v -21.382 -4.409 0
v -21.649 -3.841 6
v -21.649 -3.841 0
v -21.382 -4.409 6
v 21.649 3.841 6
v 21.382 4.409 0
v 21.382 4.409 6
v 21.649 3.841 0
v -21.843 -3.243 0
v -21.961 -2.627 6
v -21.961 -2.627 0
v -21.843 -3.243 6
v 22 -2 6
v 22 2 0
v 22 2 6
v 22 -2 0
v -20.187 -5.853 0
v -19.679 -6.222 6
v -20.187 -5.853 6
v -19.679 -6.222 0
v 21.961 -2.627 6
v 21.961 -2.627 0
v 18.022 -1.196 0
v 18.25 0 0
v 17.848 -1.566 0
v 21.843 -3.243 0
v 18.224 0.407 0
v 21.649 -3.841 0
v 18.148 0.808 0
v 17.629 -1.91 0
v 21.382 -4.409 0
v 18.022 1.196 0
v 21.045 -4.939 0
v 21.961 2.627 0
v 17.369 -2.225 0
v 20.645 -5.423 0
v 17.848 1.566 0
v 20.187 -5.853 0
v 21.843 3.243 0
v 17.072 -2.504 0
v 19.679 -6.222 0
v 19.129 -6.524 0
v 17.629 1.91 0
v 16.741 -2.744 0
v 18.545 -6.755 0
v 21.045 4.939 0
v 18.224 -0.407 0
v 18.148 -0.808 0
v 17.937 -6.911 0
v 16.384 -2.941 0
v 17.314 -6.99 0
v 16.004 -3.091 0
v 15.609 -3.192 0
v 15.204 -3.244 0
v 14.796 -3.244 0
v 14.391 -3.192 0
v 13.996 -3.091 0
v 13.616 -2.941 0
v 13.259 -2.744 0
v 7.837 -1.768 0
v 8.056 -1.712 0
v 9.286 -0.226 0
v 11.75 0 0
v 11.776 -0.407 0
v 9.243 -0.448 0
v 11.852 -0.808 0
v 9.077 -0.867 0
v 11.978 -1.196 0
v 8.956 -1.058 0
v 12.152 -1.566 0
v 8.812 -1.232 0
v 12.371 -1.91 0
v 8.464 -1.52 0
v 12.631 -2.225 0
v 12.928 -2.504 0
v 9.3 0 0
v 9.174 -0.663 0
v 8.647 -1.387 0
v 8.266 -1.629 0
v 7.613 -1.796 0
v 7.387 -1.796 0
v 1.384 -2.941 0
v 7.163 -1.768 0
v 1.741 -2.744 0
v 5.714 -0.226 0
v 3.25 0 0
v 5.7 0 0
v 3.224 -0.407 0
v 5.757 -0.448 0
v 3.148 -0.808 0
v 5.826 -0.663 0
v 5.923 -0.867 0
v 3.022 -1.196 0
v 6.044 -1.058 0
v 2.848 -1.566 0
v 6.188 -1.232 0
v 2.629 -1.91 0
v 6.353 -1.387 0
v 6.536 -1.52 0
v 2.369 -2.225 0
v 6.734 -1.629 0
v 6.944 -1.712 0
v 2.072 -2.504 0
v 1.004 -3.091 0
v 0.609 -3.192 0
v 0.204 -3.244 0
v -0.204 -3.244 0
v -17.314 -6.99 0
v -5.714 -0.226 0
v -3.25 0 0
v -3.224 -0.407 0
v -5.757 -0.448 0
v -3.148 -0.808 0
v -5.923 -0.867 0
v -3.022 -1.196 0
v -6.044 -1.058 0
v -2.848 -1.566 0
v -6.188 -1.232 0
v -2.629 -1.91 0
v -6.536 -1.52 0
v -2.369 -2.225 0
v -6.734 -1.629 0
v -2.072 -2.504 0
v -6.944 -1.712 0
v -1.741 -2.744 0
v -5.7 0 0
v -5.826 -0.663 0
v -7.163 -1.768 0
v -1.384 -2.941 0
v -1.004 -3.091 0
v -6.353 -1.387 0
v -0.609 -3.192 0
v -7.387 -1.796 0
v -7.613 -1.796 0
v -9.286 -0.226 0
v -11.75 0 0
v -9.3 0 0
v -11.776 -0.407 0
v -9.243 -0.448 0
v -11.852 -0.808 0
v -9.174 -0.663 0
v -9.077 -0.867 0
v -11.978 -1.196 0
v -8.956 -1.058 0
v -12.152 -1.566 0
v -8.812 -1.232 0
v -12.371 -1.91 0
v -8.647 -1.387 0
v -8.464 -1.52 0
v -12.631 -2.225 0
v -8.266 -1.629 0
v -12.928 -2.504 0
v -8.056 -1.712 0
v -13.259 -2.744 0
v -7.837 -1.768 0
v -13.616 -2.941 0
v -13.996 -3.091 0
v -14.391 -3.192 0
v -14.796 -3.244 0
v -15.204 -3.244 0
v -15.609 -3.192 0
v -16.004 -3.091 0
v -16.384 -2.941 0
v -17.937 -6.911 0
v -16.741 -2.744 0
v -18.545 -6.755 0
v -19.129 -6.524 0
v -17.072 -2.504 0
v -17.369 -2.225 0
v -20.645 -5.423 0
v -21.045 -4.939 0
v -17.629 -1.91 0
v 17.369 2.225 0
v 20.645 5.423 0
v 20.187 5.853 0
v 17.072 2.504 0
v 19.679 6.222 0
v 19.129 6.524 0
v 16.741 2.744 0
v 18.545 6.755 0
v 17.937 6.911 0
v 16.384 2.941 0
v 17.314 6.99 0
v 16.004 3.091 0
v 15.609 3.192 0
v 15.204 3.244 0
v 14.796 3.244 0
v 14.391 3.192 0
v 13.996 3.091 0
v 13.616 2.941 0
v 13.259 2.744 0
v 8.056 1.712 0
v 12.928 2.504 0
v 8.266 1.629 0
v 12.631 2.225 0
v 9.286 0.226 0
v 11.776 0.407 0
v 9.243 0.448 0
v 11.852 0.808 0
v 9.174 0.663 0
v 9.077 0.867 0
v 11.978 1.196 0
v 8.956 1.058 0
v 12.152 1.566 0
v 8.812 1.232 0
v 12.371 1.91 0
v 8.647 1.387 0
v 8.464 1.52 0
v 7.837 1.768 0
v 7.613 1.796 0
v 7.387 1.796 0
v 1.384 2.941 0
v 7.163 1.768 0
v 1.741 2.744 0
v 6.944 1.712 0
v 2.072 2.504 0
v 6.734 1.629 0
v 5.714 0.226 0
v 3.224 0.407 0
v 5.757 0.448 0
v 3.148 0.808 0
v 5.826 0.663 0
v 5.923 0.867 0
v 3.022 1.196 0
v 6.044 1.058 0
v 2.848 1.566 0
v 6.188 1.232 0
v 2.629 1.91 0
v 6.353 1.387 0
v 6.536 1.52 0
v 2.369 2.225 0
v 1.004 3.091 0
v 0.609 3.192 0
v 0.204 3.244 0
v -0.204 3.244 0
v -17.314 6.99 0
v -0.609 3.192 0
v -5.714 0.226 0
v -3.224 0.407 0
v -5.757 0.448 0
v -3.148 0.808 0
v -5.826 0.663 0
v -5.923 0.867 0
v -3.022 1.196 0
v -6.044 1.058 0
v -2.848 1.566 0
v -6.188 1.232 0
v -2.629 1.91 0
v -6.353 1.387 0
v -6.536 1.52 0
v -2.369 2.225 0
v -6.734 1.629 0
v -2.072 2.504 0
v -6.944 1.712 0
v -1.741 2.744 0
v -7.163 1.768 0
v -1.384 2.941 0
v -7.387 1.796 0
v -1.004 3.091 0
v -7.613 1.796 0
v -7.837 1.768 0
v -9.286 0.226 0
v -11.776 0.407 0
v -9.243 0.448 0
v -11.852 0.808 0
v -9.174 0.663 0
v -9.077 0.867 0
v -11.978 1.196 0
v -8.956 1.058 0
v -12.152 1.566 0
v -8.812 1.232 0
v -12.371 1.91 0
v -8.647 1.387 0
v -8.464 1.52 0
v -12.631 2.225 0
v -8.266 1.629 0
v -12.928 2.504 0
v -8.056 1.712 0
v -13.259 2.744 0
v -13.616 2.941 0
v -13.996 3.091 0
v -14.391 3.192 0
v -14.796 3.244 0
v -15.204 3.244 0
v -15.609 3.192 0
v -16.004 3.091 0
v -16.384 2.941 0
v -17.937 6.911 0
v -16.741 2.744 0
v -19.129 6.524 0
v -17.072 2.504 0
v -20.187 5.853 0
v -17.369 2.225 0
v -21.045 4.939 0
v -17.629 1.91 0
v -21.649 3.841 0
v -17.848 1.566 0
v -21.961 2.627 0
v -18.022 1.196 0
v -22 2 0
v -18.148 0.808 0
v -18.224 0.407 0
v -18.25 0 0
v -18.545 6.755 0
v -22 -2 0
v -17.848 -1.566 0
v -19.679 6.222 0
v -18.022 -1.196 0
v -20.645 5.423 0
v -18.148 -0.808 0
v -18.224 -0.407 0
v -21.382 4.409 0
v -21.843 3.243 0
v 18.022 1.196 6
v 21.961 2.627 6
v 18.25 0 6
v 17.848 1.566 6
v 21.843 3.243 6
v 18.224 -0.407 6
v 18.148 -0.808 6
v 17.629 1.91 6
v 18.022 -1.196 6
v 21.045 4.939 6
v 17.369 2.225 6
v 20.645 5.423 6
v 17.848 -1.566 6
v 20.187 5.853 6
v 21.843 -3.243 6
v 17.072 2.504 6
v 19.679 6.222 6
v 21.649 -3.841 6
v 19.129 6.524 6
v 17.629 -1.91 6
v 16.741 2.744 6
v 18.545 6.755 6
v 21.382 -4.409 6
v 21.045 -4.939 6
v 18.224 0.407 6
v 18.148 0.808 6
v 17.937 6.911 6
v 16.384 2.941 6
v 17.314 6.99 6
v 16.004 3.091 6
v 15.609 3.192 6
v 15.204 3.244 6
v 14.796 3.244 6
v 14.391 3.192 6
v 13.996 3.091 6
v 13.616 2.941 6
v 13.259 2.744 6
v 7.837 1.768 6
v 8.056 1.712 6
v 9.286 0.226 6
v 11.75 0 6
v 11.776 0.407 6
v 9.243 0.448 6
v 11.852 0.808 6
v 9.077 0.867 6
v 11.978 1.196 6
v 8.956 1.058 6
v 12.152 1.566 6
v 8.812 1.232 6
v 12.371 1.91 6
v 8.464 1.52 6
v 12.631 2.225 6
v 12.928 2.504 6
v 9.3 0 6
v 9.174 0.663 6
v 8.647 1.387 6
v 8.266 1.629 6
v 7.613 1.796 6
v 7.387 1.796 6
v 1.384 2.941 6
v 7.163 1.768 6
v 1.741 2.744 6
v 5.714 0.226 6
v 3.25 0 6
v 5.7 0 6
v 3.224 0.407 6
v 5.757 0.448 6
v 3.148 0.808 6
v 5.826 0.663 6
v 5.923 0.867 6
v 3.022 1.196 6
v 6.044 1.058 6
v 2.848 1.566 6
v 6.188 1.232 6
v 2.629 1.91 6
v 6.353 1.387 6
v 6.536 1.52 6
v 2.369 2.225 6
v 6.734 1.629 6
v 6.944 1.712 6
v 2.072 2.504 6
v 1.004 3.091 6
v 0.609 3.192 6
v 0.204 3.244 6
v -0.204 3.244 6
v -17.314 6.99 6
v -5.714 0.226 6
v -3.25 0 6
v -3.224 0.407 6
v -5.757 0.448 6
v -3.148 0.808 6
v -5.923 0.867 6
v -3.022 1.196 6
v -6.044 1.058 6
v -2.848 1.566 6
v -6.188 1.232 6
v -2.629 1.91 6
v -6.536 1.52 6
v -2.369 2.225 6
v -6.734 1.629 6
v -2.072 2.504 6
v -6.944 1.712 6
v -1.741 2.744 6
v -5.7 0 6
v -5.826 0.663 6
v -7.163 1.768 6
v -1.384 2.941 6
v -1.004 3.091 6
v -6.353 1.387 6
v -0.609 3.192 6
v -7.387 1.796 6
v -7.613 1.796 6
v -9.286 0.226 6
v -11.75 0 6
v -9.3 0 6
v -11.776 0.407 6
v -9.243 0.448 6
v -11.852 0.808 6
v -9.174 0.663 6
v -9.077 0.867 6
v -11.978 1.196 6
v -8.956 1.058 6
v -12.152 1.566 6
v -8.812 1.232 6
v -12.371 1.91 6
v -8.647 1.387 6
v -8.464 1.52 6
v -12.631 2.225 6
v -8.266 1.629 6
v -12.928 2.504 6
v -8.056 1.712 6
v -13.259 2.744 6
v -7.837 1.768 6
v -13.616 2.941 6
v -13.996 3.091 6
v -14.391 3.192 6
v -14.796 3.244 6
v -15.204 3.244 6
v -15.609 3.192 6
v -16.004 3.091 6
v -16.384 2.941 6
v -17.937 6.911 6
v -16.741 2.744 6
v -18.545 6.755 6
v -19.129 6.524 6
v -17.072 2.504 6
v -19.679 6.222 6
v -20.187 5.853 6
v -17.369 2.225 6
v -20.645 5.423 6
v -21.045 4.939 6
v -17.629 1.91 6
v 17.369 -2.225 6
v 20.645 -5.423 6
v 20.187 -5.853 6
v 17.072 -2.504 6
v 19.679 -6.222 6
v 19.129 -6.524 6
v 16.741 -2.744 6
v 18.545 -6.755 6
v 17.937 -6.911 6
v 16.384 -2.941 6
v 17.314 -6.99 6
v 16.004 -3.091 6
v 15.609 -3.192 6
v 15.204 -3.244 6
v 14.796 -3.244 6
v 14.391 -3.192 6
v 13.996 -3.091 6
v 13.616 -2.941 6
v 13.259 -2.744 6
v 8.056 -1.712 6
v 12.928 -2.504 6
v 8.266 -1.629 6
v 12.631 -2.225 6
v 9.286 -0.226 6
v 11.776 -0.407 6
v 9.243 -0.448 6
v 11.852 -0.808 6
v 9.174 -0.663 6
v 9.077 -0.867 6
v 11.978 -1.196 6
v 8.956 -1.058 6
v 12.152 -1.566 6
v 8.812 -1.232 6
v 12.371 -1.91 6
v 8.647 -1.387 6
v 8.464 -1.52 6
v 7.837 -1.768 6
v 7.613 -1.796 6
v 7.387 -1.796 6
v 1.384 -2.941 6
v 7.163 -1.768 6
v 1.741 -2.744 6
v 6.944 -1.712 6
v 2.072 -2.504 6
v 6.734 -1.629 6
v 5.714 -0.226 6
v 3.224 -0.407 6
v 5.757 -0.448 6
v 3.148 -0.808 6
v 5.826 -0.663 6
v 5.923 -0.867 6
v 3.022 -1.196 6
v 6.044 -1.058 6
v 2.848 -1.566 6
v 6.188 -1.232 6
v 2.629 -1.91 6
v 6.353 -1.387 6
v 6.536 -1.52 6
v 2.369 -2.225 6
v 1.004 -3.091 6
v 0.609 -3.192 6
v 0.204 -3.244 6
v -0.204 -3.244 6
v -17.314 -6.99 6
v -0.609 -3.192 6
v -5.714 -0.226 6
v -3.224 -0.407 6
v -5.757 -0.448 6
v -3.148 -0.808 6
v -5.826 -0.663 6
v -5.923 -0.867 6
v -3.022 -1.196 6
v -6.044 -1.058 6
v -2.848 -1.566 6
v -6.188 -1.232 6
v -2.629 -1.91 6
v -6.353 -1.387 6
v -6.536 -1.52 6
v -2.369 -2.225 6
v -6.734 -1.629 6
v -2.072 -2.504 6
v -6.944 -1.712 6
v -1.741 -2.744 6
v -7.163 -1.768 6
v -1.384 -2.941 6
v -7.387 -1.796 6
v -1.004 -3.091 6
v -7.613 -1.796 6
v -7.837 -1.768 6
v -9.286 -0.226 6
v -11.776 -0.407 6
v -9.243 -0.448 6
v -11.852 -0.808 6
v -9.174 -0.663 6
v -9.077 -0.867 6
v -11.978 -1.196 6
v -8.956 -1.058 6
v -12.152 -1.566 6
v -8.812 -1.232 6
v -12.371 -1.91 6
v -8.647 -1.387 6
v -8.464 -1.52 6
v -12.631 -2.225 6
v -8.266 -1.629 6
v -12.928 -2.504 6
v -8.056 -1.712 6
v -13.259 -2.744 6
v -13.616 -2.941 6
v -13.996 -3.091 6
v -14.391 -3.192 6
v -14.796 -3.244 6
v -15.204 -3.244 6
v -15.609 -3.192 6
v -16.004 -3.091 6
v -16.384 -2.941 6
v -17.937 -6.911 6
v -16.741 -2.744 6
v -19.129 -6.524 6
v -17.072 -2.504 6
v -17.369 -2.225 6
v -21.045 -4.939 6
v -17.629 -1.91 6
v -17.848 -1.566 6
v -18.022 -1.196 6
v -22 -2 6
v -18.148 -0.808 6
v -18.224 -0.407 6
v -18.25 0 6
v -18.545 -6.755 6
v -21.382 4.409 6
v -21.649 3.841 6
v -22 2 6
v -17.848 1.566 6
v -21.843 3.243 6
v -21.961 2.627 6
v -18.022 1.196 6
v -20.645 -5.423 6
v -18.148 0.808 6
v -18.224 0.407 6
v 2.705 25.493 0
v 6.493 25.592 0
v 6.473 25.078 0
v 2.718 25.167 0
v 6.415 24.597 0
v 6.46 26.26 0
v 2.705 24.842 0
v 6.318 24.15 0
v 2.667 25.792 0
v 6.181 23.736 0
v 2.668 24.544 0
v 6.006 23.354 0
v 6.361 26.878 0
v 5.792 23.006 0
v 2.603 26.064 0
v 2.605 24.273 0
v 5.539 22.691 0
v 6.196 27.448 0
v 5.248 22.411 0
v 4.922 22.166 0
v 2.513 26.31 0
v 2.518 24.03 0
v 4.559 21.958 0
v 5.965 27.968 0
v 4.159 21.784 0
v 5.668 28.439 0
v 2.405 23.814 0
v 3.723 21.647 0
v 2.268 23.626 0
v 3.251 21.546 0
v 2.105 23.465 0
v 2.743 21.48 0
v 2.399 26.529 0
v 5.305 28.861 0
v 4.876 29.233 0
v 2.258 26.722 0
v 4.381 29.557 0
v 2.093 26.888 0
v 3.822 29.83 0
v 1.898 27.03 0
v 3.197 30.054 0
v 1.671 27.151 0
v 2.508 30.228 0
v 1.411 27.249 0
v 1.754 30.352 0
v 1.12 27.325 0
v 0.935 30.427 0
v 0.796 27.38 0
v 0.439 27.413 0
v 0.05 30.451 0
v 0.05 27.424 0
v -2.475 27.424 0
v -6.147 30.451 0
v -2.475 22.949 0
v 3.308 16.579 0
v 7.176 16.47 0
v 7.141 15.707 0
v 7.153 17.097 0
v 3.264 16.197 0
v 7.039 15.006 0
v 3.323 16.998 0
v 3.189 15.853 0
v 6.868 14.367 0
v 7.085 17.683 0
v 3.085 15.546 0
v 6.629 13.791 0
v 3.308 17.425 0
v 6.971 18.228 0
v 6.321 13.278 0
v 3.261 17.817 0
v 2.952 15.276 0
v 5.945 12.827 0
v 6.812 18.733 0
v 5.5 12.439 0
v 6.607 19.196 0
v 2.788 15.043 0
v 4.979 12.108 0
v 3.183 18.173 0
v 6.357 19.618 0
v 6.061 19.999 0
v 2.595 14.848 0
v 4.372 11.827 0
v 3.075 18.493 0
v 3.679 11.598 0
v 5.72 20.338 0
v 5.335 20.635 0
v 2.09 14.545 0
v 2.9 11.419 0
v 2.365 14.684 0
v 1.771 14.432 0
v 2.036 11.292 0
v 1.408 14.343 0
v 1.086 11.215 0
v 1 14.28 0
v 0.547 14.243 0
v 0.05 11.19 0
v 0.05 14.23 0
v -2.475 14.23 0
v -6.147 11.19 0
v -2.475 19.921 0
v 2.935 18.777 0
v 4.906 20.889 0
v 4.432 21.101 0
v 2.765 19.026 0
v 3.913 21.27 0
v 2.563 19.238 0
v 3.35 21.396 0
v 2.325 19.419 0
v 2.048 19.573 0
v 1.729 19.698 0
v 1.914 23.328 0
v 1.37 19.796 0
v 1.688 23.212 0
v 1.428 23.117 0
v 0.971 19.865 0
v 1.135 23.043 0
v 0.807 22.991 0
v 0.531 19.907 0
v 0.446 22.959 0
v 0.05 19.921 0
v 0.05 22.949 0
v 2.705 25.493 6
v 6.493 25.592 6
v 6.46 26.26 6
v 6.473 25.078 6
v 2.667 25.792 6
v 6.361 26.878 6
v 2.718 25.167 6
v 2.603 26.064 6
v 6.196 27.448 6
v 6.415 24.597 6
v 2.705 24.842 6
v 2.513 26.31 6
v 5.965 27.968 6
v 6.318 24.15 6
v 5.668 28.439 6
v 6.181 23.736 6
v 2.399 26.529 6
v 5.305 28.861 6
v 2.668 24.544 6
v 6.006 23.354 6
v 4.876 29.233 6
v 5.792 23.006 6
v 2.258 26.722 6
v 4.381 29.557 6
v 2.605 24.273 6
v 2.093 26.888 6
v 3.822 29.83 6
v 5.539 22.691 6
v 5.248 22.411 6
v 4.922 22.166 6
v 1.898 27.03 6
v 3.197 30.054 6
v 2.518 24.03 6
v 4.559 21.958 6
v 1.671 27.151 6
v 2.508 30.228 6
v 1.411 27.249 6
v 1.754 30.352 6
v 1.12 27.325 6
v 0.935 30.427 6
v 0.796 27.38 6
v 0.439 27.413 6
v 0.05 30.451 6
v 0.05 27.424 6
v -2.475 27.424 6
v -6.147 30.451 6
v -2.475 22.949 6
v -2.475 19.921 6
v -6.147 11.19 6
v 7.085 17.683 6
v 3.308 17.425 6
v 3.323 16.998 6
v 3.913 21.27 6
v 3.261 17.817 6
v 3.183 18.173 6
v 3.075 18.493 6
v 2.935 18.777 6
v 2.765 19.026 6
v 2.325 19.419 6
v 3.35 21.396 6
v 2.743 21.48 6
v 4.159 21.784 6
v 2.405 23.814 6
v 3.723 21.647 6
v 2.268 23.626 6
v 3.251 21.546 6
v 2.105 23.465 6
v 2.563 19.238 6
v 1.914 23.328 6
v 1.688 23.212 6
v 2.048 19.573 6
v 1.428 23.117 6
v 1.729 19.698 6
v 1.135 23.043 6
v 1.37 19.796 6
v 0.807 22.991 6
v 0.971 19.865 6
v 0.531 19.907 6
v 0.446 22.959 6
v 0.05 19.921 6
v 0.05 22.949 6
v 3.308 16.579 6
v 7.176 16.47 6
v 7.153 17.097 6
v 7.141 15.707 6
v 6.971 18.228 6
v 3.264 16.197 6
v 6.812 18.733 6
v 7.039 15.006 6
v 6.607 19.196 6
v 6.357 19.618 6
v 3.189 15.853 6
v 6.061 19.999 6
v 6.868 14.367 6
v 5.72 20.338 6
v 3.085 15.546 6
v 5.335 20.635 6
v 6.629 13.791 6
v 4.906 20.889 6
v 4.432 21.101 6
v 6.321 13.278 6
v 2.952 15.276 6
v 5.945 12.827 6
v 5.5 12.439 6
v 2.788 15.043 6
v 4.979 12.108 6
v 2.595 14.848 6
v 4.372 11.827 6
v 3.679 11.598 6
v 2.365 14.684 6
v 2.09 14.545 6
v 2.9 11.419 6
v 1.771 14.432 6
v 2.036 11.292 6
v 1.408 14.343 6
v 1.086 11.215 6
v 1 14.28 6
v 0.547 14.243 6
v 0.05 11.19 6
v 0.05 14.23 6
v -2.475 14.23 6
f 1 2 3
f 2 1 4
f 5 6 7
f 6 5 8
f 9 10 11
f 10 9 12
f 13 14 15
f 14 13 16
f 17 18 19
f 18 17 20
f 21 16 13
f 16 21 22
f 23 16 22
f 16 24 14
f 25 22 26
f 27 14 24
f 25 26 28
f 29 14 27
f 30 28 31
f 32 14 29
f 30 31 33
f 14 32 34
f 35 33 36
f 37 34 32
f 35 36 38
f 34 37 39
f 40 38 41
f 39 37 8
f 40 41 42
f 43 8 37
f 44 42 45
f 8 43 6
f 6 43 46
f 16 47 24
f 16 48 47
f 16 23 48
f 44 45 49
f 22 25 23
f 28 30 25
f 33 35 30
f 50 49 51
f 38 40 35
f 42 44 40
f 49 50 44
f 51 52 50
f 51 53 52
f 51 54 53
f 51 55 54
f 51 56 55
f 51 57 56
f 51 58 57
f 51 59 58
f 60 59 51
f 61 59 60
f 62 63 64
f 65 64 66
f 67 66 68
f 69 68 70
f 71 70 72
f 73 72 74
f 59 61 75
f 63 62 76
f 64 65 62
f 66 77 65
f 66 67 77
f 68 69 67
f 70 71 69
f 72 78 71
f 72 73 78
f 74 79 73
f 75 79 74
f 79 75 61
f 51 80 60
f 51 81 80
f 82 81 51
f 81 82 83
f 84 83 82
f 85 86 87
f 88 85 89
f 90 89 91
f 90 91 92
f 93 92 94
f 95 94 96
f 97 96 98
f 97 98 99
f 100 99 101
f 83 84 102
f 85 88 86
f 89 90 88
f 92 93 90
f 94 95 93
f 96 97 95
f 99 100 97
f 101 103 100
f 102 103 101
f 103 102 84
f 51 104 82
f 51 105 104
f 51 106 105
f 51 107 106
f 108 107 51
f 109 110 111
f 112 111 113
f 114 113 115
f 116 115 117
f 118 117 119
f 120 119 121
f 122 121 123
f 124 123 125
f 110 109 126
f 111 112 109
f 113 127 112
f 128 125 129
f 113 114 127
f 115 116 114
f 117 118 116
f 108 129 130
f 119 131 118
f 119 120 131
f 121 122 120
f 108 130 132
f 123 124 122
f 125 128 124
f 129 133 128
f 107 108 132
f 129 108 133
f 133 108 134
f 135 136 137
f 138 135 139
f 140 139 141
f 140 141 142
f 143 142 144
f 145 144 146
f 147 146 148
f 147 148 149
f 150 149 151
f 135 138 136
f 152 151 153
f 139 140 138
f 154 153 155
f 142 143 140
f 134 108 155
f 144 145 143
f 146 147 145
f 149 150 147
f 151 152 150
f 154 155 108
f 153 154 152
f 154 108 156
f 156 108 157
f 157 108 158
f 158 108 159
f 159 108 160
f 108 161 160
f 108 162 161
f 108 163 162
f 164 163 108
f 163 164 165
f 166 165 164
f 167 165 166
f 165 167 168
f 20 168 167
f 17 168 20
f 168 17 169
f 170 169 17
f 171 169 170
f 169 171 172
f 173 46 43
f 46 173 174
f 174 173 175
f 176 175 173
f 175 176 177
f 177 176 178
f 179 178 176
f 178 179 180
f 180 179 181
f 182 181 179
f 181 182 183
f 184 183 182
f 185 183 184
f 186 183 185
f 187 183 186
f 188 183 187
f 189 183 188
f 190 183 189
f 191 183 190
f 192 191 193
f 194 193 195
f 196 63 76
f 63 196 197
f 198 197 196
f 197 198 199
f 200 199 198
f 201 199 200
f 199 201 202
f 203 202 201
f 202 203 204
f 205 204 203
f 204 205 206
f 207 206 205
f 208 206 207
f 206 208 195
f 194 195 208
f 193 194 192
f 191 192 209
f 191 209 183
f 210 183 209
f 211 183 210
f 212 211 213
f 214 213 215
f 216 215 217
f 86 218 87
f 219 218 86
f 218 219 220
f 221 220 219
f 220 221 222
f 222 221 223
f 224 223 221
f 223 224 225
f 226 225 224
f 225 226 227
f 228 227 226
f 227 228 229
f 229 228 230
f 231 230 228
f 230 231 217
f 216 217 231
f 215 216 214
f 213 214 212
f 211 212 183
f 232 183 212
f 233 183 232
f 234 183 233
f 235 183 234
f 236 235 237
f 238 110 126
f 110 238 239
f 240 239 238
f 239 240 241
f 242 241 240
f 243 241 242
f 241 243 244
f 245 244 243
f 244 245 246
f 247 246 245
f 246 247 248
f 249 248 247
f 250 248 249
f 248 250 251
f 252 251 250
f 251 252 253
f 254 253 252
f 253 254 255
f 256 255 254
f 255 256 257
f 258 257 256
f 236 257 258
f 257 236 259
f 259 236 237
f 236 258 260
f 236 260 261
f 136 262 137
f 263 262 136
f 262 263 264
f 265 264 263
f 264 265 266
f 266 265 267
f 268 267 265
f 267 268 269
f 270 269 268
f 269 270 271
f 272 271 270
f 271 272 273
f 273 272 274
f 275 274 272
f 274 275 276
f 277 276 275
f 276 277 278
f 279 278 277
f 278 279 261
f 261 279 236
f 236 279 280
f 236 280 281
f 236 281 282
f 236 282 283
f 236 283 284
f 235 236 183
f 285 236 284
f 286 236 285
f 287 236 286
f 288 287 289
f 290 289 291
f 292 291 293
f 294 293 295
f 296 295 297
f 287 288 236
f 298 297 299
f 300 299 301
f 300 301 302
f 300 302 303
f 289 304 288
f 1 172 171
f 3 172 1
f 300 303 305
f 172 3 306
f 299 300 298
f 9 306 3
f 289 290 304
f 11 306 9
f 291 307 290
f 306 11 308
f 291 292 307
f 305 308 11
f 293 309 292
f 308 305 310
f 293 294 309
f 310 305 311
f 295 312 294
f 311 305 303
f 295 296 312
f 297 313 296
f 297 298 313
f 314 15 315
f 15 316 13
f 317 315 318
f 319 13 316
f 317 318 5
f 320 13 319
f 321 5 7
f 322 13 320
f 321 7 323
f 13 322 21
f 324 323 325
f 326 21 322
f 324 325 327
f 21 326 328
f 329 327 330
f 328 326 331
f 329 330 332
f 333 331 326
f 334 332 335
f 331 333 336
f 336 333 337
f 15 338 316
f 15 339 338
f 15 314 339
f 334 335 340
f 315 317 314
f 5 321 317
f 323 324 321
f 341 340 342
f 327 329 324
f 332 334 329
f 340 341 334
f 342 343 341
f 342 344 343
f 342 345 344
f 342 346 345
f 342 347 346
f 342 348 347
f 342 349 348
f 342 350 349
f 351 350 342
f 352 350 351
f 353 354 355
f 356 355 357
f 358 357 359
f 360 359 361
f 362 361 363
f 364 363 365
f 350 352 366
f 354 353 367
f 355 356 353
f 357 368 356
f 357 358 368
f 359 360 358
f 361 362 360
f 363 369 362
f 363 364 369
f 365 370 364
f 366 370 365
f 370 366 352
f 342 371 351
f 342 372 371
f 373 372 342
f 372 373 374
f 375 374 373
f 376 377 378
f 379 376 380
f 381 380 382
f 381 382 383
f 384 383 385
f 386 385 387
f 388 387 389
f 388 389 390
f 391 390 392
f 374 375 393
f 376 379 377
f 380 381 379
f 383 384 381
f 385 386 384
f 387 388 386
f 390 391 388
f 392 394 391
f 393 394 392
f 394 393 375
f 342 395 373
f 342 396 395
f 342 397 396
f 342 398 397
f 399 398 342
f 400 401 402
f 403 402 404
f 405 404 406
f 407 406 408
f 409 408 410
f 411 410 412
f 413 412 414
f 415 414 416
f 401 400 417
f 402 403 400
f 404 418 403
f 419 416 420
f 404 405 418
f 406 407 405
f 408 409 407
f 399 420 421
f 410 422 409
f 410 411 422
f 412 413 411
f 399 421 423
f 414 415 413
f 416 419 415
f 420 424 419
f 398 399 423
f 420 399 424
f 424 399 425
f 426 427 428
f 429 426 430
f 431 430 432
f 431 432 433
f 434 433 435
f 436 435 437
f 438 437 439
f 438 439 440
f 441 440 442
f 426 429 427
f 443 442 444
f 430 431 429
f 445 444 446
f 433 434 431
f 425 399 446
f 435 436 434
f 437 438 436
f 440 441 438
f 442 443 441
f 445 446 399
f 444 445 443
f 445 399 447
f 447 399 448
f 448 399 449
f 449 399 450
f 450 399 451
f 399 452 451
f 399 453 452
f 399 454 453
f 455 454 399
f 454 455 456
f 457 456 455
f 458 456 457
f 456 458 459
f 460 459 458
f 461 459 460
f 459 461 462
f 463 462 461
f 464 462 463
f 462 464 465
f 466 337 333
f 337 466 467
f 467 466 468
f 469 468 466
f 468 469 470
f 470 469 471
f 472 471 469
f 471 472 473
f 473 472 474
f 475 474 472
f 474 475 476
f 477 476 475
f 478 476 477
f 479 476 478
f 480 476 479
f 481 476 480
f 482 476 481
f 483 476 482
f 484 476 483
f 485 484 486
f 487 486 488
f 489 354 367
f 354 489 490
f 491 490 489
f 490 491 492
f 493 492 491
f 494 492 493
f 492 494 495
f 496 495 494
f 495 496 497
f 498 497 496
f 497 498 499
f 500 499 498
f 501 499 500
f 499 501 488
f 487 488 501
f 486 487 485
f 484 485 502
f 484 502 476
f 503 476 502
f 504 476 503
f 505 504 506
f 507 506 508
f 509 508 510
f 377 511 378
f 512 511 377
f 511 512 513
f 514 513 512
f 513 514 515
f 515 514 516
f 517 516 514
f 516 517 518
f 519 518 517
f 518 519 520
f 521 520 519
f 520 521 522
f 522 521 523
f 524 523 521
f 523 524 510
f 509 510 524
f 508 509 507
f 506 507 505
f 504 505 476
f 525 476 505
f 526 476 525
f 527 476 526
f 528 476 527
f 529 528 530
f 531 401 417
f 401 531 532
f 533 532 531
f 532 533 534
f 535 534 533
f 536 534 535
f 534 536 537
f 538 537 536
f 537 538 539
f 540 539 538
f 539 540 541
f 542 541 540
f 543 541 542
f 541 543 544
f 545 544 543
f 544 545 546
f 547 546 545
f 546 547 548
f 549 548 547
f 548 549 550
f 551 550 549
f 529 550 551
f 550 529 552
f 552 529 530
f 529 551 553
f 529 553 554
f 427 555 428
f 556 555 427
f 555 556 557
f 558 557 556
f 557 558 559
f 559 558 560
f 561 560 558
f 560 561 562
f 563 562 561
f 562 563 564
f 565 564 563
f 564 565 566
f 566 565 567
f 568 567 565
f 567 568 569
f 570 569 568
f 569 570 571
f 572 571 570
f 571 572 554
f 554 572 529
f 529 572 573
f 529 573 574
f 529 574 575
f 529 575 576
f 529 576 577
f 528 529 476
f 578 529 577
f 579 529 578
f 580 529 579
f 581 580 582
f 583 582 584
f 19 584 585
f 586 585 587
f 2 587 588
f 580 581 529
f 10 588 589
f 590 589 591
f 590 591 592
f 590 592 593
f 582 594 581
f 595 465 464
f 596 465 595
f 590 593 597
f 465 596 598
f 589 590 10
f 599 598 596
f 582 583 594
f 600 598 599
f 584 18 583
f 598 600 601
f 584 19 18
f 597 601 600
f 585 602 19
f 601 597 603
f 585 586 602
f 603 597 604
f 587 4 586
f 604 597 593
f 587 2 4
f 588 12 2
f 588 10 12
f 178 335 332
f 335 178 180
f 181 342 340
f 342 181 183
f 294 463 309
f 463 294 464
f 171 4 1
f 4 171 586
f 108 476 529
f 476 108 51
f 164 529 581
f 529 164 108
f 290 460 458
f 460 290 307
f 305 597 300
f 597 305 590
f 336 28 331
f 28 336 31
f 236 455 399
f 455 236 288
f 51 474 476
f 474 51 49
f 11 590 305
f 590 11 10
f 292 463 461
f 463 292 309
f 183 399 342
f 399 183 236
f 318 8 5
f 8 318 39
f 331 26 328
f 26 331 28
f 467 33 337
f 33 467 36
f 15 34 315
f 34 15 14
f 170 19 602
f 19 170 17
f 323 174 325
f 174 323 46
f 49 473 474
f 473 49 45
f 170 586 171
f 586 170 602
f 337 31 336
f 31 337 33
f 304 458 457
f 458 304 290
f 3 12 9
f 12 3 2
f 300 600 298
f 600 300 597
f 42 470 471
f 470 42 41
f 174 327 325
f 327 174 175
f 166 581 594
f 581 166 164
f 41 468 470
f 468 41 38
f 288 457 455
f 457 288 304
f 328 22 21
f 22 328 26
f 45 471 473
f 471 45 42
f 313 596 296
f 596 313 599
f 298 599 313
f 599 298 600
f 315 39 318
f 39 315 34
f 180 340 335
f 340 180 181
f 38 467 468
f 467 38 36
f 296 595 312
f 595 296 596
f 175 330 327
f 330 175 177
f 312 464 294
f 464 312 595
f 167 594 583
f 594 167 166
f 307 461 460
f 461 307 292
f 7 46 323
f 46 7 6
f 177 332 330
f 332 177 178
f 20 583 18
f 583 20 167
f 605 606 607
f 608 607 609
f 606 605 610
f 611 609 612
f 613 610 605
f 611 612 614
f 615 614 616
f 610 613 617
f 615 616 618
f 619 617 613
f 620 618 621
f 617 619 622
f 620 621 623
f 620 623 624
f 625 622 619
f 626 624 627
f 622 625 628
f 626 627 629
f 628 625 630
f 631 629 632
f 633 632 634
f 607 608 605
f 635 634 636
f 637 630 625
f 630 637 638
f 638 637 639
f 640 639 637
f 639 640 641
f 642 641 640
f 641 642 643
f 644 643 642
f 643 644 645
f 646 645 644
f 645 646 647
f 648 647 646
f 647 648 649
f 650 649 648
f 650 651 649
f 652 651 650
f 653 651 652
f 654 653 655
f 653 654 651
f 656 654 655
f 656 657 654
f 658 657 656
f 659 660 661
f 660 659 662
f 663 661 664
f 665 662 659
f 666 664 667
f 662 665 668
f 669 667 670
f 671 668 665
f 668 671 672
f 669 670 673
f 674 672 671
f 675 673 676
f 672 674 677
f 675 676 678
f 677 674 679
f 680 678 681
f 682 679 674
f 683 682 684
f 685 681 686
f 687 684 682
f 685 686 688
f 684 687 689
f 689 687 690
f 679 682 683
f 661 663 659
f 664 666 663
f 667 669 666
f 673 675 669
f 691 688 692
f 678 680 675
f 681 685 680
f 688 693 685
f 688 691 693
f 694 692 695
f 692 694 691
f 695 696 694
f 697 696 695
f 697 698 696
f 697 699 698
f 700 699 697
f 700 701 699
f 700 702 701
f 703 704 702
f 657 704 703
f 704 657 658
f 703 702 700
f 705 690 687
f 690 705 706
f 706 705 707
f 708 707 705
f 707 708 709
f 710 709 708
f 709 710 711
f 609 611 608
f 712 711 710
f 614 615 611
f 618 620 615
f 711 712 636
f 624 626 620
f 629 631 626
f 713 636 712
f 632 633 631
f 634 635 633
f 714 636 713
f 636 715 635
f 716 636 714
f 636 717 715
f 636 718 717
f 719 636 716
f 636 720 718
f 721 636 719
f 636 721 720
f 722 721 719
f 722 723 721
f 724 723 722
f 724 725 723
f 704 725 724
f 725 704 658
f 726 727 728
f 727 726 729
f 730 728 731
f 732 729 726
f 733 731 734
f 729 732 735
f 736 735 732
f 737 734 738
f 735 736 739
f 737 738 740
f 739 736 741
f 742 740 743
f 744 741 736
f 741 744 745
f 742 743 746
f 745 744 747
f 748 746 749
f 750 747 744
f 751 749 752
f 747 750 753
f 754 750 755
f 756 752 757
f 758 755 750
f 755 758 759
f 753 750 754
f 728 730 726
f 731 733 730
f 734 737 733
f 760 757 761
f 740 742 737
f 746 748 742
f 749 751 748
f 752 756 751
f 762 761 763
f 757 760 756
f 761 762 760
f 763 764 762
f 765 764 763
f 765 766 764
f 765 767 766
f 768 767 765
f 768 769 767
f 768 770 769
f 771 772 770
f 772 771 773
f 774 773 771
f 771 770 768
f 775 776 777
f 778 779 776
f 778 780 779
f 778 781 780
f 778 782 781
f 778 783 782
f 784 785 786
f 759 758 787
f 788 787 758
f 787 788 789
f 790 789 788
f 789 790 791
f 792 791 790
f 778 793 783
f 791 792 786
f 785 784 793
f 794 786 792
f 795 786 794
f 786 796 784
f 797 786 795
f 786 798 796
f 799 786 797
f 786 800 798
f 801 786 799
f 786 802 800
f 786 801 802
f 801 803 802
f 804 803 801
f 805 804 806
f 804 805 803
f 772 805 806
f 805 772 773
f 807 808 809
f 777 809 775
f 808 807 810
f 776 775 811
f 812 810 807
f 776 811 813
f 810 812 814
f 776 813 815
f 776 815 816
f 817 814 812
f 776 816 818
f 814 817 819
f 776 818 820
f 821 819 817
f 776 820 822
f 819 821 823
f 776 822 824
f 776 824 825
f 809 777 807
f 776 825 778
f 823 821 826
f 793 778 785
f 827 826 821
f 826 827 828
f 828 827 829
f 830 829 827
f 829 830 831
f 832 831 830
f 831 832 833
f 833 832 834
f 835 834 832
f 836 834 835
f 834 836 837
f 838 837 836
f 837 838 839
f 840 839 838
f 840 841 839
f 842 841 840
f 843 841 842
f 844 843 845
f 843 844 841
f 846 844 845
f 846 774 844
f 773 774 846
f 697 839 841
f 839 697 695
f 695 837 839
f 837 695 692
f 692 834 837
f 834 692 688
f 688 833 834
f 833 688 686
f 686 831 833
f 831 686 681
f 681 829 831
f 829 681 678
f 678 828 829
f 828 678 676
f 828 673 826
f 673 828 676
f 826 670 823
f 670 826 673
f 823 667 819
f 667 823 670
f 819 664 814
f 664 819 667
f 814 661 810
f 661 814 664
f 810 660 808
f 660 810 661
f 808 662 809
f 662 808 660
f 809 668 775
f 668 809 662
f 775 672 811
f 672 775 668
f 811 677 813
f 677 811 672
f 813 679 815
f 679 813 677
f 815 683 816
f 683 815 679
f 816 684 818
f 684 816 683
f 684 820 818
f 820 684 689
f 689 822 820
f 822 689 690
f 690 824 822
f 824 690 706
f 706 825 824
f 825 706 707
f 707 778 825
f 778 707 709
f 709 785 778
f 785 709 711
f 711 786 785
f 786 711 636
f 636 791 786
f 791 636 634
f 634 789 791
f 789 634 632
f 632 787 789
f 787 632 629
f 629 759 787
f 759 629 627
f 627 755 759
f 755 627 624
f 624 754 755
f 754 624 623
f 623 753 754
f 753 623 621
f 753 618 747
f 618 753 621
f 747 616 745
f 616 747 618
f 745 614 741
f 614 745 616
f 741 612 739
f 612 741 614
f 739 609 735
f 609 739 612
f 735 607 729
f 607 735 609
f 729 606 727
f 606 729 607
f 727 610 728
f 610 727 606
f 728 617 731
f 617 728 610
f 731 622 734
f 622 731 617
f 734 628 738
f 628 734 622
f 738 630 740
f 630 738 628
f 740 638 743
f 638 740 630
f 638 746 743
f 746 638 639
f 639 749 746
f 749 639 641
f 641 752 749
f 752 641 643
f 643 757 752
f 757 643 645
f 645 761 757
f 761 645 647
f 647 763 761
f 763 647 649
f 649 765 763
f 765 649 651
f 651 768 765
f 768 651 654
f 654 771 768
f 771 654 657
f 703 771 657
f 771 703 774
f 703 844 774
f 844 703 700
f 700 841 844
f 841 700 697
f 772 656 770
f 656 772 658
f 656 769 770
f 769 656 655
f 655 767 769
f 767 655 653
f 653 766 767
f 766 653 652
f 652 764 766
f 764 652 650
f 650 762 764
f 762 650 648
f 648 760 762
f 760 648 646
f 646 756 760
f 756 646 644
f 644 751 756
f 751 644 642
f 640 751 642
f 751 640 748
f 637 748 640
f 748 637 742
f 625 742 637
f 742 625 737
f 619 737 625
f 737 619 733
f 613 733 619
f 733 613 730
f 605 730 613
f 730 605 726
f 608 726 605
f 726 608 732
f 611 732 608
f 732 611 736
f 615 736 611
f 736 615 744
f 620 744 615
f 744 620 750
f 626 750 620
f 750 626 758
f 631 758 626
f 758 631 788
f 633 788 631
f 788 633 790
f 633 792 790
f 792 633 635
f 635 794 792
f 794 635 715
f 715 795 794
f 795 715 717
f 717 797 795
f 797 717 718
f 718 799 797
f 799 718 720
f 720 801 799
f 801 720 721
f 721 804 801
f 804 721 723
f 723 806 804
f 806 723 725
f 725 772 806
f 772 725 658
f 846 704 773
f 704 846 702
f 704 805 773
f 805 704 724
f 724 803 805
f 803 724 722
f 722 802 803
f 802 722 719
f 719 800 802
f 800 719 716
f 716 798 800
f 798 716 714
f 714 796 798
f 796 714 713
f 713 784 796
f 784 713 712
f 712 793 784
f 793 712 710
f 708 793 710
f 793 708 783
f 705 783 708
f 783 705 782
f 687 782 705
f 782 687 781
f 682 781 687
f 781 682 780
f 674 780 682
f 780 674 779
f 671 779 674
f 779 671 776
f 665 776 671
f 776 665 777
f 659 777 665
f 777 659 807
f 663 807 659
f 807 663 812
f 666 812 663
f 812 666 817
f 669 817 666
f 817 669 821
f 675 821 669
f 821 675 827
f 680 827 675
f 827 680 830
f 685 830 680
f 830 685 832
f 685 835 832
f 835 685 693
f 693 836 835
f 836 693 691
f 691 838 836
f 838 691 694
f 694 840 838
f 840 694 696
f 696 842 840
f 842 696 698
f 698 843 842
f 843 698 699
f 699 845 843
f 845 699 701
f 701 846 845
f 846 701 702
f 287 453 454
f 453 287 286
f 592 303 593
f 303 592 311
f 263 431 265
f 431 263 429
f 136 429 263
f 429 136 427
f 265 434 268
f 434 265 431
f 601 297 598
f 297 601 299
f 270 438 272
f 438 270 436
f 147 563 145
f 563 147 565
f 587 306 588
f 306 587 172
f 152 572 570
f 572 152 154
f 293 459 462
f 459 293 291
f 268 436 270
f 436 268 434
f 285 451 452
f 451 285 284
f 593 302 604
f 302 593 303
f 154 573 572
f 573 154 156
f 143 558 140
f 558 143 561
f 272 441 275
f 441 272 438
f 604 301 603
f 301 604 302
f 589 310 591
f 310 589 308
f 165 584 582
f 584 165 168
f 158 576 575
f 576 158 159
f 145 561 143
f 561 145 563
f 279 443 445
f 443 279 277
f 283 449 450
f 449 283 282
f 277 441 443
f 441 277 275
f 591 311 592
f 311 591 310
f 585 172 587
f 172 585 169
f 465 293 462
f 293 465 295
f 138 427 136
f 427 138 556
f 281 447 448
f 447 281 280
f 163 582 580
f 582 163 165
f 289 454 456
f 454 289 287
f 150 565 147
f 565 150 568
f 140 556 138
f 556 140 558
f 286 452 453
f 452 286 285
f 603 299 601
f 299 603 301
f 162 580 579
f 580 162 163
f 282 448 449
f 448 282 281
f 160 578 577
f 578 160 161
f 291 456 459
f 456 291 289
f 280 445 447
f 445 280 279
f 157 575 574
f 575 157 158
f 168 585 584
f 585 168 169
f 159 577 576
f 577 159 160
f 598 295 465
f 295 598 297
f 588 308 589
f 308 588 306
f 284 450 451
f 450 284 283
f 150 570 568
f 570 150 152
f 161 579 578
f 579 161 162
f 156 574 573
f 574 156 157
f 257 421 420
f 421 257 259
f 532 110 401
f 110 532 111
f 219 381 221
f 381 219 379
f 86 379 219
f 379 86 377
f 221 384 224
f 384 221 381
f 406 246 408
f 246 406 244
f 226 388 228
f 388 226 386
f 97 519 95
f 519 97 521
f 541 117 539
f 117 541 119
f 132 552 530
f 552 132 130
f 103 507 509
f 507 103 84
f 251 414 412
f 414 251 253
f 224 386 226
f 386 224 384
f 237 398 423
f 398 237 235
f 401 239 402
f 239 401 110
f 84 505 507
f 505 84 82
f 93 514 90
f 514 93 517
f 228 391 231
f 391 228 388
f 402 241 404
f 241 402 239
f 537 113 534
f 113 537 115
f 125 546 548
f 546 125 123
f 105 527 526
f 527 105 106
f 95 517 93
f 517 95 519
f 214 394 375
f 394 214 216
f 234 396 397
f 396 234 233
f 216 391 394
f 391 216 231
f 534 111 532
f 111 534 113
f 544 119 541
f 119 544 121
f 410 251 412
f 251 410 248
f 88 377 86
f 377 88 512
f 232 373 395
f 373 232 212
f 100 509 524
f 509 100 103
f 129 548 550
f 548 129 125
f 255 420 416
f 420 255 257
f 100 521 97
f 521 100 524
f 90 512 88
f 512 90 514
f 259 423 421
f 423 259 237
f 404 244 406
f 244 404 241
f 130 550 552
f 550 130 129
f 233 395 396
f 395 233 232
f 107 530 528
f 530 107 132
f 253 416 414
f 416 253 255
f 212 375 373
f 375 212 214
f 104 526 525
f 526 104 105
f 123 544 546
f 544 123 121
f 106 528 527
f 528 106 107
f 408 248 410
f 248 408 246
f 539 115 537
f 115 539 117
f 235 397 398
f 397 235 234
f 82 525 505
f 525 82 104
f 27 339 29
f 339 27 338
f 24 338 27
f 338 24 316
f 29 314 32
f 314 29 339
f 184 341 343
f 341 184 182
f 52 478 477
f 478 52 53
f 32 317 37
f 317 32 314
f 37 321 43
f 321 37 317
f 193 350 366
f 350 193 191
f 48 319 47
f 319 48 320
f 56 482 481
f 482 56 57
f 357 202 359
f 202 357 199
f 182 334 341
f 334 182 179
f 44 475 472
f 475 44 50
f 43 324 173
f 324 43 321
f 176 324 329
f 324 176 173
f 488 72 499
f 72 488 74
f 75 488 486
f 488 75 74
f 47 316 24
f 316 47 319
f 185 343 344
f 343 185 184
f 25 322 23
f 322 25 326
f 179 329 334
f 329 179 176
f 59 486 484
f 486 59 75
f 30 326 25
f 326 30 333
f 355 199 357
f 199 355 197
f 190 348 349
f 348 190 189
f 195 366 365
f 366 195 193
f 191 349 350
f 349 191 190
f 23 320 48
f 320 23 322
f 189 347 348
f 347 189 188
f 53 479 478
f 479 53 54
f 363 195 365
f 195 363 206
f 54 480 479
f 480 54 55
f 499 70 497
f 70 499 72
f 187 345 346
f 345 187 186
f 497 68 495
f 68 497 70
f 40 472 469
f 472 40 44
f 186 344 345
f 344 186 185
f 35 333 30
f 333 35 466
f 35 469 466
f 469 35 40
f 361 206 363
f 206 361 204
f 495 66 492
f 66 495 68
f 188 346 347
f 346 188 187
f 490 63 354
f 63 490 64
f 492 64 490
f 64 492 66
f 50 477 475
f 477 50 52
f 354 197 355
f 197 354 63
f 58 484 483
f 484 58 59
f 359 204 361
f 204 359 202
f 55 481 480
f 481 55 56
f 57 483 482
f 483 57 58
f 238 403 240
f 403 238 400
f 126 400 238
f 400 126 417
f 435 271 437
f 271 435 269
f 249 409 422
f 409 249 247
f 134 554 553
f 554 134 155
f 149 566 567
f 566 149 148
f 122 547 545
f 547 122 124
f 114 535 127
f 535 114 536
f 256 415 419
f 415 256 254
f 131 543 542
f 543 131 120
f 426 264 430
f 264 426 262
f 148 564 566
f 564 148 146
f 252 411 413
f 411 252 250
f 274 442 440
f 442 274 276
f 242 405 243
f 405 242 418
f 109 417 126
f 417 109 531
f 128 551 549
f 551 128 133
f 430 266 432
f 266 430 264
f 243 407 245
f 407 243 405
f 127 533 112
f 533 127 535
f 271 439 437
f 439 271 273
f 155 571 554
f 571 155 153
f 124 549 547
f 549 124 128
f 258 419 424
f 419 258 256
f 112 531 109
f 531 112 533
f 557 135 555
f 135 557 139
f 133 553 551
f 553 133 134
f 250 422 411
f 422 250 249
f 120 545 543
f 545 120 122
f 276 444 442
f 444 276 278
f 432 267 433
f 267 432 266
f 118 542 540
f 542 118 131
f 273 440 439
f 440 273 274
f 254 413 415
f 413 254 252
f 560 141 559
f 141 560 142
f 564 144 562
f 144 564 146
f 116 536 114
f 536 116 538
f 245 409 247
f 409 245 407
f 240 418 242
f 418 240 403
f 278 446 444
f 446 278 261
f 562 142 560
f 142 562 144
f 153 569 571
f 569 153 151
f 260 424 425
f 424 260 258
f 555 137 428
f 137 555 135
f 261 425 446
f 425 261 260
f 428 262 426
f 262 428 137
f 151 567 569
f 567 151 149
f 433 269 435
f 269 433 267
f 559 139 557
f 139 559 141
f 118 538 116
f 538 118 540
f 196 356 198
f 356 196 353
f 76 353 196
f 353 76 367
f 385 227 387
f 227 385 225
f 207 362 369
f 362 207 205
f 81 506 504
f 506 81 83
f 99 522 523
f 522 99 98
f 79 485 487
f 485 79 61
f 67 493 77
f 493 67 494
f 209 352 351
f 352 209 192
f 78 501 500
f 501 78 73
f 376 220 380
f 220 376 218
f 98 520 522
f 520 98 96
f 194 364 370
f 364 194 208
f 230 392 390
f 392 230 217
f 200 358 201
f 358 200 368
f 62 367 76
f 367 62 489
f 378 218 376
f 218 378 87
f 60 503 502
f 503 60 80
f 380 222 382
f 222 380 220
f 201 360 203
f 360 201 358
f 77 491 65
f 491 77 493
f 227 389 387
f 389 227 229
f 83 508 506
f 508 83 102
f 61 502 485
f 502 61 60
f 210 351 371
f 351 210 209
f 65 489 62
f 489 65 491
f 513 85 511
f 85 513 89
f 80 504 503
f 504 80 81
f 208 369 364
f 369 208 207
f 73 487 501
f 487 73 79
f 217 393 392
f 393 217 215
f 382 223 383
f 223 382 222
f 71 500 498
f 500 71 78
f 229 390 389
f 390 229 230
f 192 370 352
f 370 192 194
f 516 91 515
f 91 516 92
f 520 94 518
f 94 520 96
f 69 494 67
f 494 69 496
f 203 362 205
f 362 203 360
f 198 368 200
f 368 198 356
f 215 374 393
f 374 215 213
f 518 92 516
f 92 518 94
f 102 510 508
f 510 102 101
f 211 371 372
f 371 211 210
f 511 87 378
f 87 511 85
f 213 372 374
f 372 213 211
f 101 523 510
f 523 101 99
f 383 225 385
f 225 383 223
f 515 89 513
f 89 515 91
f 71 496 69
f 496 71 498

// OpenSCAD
$fn = 50;


difference() {
	union() {
		hull() {
			translate(v = [-17.0000000000, 2.0000000000, 0]) {
				cylinder(h = 6, r = 5);
			}
			translate(v = [17.0000000000, 2.0000000000, 0]) {
				cylinder(h = 6, r = 5);
			}
			translate(v = [-17.0000000000, -2.0000000000, 0]) {
				cylinder(h = 6, r = 5);
			}
			translate(v = [17.0000000000, -2.0000000000, 0]) {
				cylinder(h = 6, r = 5);
			}
		}
		translate(v = [0, 30.0000000000, 0]) {
			linear_extrude(height = 6) {
				text(font = "DejaVu Sans Mono:style=Bold", halign = "center", size = 19.0000000000, text = "B", valign = "top");
			}
		}
	}
	union() {
		translate(v = [-15.0000000000, 0.0000000000, 0]) {
			translate(v = [0, 0, -100]) {
				cylinder(h = 200, r = 3.2500000000);
			}
		}
		translate(v = [0, 0, -100]) {
			cylinder(h = 200, r = 3.2500000000);
		}
		translate(v = [15.0000000000, 0.0000000000, 0]) {
			translate(v = [0, 0, -100]) {
				cylinder(h = 200, r = 3.2500000000);
			}
		}
		translate(v = [-15.0000000000, 0.0000000000, 0]) {
			translate(v = [0, 0, -100]) {
				cylinder(h = 200, r = 1.8000000000);
			}
		}
		translate(v = [-7.5000000000, 0.0000000000, 0]) {
			translate(v = [0, 0, -100]) {
				cylinder(h = 200, r = 1.8000000000);
			}
		}
		translate(v = [0, 0, -100]) {
			cylinder(h = 200, r = 1.8000000000);
		}
		translate(v = [7.5000000000, 0.0000000000, 0]) {
			translate(v = [0, 0, -100]) {
				cylinder(h = 200, r = 1.8000000000);
			}
		}
		translate(v = [15.0000000000, 0.0000000000, 0]) {
			translate(v = [0, 0, -100]) {
				cylinder(h = 200, r = 1.8000000000);
			}
		}
	}
}
